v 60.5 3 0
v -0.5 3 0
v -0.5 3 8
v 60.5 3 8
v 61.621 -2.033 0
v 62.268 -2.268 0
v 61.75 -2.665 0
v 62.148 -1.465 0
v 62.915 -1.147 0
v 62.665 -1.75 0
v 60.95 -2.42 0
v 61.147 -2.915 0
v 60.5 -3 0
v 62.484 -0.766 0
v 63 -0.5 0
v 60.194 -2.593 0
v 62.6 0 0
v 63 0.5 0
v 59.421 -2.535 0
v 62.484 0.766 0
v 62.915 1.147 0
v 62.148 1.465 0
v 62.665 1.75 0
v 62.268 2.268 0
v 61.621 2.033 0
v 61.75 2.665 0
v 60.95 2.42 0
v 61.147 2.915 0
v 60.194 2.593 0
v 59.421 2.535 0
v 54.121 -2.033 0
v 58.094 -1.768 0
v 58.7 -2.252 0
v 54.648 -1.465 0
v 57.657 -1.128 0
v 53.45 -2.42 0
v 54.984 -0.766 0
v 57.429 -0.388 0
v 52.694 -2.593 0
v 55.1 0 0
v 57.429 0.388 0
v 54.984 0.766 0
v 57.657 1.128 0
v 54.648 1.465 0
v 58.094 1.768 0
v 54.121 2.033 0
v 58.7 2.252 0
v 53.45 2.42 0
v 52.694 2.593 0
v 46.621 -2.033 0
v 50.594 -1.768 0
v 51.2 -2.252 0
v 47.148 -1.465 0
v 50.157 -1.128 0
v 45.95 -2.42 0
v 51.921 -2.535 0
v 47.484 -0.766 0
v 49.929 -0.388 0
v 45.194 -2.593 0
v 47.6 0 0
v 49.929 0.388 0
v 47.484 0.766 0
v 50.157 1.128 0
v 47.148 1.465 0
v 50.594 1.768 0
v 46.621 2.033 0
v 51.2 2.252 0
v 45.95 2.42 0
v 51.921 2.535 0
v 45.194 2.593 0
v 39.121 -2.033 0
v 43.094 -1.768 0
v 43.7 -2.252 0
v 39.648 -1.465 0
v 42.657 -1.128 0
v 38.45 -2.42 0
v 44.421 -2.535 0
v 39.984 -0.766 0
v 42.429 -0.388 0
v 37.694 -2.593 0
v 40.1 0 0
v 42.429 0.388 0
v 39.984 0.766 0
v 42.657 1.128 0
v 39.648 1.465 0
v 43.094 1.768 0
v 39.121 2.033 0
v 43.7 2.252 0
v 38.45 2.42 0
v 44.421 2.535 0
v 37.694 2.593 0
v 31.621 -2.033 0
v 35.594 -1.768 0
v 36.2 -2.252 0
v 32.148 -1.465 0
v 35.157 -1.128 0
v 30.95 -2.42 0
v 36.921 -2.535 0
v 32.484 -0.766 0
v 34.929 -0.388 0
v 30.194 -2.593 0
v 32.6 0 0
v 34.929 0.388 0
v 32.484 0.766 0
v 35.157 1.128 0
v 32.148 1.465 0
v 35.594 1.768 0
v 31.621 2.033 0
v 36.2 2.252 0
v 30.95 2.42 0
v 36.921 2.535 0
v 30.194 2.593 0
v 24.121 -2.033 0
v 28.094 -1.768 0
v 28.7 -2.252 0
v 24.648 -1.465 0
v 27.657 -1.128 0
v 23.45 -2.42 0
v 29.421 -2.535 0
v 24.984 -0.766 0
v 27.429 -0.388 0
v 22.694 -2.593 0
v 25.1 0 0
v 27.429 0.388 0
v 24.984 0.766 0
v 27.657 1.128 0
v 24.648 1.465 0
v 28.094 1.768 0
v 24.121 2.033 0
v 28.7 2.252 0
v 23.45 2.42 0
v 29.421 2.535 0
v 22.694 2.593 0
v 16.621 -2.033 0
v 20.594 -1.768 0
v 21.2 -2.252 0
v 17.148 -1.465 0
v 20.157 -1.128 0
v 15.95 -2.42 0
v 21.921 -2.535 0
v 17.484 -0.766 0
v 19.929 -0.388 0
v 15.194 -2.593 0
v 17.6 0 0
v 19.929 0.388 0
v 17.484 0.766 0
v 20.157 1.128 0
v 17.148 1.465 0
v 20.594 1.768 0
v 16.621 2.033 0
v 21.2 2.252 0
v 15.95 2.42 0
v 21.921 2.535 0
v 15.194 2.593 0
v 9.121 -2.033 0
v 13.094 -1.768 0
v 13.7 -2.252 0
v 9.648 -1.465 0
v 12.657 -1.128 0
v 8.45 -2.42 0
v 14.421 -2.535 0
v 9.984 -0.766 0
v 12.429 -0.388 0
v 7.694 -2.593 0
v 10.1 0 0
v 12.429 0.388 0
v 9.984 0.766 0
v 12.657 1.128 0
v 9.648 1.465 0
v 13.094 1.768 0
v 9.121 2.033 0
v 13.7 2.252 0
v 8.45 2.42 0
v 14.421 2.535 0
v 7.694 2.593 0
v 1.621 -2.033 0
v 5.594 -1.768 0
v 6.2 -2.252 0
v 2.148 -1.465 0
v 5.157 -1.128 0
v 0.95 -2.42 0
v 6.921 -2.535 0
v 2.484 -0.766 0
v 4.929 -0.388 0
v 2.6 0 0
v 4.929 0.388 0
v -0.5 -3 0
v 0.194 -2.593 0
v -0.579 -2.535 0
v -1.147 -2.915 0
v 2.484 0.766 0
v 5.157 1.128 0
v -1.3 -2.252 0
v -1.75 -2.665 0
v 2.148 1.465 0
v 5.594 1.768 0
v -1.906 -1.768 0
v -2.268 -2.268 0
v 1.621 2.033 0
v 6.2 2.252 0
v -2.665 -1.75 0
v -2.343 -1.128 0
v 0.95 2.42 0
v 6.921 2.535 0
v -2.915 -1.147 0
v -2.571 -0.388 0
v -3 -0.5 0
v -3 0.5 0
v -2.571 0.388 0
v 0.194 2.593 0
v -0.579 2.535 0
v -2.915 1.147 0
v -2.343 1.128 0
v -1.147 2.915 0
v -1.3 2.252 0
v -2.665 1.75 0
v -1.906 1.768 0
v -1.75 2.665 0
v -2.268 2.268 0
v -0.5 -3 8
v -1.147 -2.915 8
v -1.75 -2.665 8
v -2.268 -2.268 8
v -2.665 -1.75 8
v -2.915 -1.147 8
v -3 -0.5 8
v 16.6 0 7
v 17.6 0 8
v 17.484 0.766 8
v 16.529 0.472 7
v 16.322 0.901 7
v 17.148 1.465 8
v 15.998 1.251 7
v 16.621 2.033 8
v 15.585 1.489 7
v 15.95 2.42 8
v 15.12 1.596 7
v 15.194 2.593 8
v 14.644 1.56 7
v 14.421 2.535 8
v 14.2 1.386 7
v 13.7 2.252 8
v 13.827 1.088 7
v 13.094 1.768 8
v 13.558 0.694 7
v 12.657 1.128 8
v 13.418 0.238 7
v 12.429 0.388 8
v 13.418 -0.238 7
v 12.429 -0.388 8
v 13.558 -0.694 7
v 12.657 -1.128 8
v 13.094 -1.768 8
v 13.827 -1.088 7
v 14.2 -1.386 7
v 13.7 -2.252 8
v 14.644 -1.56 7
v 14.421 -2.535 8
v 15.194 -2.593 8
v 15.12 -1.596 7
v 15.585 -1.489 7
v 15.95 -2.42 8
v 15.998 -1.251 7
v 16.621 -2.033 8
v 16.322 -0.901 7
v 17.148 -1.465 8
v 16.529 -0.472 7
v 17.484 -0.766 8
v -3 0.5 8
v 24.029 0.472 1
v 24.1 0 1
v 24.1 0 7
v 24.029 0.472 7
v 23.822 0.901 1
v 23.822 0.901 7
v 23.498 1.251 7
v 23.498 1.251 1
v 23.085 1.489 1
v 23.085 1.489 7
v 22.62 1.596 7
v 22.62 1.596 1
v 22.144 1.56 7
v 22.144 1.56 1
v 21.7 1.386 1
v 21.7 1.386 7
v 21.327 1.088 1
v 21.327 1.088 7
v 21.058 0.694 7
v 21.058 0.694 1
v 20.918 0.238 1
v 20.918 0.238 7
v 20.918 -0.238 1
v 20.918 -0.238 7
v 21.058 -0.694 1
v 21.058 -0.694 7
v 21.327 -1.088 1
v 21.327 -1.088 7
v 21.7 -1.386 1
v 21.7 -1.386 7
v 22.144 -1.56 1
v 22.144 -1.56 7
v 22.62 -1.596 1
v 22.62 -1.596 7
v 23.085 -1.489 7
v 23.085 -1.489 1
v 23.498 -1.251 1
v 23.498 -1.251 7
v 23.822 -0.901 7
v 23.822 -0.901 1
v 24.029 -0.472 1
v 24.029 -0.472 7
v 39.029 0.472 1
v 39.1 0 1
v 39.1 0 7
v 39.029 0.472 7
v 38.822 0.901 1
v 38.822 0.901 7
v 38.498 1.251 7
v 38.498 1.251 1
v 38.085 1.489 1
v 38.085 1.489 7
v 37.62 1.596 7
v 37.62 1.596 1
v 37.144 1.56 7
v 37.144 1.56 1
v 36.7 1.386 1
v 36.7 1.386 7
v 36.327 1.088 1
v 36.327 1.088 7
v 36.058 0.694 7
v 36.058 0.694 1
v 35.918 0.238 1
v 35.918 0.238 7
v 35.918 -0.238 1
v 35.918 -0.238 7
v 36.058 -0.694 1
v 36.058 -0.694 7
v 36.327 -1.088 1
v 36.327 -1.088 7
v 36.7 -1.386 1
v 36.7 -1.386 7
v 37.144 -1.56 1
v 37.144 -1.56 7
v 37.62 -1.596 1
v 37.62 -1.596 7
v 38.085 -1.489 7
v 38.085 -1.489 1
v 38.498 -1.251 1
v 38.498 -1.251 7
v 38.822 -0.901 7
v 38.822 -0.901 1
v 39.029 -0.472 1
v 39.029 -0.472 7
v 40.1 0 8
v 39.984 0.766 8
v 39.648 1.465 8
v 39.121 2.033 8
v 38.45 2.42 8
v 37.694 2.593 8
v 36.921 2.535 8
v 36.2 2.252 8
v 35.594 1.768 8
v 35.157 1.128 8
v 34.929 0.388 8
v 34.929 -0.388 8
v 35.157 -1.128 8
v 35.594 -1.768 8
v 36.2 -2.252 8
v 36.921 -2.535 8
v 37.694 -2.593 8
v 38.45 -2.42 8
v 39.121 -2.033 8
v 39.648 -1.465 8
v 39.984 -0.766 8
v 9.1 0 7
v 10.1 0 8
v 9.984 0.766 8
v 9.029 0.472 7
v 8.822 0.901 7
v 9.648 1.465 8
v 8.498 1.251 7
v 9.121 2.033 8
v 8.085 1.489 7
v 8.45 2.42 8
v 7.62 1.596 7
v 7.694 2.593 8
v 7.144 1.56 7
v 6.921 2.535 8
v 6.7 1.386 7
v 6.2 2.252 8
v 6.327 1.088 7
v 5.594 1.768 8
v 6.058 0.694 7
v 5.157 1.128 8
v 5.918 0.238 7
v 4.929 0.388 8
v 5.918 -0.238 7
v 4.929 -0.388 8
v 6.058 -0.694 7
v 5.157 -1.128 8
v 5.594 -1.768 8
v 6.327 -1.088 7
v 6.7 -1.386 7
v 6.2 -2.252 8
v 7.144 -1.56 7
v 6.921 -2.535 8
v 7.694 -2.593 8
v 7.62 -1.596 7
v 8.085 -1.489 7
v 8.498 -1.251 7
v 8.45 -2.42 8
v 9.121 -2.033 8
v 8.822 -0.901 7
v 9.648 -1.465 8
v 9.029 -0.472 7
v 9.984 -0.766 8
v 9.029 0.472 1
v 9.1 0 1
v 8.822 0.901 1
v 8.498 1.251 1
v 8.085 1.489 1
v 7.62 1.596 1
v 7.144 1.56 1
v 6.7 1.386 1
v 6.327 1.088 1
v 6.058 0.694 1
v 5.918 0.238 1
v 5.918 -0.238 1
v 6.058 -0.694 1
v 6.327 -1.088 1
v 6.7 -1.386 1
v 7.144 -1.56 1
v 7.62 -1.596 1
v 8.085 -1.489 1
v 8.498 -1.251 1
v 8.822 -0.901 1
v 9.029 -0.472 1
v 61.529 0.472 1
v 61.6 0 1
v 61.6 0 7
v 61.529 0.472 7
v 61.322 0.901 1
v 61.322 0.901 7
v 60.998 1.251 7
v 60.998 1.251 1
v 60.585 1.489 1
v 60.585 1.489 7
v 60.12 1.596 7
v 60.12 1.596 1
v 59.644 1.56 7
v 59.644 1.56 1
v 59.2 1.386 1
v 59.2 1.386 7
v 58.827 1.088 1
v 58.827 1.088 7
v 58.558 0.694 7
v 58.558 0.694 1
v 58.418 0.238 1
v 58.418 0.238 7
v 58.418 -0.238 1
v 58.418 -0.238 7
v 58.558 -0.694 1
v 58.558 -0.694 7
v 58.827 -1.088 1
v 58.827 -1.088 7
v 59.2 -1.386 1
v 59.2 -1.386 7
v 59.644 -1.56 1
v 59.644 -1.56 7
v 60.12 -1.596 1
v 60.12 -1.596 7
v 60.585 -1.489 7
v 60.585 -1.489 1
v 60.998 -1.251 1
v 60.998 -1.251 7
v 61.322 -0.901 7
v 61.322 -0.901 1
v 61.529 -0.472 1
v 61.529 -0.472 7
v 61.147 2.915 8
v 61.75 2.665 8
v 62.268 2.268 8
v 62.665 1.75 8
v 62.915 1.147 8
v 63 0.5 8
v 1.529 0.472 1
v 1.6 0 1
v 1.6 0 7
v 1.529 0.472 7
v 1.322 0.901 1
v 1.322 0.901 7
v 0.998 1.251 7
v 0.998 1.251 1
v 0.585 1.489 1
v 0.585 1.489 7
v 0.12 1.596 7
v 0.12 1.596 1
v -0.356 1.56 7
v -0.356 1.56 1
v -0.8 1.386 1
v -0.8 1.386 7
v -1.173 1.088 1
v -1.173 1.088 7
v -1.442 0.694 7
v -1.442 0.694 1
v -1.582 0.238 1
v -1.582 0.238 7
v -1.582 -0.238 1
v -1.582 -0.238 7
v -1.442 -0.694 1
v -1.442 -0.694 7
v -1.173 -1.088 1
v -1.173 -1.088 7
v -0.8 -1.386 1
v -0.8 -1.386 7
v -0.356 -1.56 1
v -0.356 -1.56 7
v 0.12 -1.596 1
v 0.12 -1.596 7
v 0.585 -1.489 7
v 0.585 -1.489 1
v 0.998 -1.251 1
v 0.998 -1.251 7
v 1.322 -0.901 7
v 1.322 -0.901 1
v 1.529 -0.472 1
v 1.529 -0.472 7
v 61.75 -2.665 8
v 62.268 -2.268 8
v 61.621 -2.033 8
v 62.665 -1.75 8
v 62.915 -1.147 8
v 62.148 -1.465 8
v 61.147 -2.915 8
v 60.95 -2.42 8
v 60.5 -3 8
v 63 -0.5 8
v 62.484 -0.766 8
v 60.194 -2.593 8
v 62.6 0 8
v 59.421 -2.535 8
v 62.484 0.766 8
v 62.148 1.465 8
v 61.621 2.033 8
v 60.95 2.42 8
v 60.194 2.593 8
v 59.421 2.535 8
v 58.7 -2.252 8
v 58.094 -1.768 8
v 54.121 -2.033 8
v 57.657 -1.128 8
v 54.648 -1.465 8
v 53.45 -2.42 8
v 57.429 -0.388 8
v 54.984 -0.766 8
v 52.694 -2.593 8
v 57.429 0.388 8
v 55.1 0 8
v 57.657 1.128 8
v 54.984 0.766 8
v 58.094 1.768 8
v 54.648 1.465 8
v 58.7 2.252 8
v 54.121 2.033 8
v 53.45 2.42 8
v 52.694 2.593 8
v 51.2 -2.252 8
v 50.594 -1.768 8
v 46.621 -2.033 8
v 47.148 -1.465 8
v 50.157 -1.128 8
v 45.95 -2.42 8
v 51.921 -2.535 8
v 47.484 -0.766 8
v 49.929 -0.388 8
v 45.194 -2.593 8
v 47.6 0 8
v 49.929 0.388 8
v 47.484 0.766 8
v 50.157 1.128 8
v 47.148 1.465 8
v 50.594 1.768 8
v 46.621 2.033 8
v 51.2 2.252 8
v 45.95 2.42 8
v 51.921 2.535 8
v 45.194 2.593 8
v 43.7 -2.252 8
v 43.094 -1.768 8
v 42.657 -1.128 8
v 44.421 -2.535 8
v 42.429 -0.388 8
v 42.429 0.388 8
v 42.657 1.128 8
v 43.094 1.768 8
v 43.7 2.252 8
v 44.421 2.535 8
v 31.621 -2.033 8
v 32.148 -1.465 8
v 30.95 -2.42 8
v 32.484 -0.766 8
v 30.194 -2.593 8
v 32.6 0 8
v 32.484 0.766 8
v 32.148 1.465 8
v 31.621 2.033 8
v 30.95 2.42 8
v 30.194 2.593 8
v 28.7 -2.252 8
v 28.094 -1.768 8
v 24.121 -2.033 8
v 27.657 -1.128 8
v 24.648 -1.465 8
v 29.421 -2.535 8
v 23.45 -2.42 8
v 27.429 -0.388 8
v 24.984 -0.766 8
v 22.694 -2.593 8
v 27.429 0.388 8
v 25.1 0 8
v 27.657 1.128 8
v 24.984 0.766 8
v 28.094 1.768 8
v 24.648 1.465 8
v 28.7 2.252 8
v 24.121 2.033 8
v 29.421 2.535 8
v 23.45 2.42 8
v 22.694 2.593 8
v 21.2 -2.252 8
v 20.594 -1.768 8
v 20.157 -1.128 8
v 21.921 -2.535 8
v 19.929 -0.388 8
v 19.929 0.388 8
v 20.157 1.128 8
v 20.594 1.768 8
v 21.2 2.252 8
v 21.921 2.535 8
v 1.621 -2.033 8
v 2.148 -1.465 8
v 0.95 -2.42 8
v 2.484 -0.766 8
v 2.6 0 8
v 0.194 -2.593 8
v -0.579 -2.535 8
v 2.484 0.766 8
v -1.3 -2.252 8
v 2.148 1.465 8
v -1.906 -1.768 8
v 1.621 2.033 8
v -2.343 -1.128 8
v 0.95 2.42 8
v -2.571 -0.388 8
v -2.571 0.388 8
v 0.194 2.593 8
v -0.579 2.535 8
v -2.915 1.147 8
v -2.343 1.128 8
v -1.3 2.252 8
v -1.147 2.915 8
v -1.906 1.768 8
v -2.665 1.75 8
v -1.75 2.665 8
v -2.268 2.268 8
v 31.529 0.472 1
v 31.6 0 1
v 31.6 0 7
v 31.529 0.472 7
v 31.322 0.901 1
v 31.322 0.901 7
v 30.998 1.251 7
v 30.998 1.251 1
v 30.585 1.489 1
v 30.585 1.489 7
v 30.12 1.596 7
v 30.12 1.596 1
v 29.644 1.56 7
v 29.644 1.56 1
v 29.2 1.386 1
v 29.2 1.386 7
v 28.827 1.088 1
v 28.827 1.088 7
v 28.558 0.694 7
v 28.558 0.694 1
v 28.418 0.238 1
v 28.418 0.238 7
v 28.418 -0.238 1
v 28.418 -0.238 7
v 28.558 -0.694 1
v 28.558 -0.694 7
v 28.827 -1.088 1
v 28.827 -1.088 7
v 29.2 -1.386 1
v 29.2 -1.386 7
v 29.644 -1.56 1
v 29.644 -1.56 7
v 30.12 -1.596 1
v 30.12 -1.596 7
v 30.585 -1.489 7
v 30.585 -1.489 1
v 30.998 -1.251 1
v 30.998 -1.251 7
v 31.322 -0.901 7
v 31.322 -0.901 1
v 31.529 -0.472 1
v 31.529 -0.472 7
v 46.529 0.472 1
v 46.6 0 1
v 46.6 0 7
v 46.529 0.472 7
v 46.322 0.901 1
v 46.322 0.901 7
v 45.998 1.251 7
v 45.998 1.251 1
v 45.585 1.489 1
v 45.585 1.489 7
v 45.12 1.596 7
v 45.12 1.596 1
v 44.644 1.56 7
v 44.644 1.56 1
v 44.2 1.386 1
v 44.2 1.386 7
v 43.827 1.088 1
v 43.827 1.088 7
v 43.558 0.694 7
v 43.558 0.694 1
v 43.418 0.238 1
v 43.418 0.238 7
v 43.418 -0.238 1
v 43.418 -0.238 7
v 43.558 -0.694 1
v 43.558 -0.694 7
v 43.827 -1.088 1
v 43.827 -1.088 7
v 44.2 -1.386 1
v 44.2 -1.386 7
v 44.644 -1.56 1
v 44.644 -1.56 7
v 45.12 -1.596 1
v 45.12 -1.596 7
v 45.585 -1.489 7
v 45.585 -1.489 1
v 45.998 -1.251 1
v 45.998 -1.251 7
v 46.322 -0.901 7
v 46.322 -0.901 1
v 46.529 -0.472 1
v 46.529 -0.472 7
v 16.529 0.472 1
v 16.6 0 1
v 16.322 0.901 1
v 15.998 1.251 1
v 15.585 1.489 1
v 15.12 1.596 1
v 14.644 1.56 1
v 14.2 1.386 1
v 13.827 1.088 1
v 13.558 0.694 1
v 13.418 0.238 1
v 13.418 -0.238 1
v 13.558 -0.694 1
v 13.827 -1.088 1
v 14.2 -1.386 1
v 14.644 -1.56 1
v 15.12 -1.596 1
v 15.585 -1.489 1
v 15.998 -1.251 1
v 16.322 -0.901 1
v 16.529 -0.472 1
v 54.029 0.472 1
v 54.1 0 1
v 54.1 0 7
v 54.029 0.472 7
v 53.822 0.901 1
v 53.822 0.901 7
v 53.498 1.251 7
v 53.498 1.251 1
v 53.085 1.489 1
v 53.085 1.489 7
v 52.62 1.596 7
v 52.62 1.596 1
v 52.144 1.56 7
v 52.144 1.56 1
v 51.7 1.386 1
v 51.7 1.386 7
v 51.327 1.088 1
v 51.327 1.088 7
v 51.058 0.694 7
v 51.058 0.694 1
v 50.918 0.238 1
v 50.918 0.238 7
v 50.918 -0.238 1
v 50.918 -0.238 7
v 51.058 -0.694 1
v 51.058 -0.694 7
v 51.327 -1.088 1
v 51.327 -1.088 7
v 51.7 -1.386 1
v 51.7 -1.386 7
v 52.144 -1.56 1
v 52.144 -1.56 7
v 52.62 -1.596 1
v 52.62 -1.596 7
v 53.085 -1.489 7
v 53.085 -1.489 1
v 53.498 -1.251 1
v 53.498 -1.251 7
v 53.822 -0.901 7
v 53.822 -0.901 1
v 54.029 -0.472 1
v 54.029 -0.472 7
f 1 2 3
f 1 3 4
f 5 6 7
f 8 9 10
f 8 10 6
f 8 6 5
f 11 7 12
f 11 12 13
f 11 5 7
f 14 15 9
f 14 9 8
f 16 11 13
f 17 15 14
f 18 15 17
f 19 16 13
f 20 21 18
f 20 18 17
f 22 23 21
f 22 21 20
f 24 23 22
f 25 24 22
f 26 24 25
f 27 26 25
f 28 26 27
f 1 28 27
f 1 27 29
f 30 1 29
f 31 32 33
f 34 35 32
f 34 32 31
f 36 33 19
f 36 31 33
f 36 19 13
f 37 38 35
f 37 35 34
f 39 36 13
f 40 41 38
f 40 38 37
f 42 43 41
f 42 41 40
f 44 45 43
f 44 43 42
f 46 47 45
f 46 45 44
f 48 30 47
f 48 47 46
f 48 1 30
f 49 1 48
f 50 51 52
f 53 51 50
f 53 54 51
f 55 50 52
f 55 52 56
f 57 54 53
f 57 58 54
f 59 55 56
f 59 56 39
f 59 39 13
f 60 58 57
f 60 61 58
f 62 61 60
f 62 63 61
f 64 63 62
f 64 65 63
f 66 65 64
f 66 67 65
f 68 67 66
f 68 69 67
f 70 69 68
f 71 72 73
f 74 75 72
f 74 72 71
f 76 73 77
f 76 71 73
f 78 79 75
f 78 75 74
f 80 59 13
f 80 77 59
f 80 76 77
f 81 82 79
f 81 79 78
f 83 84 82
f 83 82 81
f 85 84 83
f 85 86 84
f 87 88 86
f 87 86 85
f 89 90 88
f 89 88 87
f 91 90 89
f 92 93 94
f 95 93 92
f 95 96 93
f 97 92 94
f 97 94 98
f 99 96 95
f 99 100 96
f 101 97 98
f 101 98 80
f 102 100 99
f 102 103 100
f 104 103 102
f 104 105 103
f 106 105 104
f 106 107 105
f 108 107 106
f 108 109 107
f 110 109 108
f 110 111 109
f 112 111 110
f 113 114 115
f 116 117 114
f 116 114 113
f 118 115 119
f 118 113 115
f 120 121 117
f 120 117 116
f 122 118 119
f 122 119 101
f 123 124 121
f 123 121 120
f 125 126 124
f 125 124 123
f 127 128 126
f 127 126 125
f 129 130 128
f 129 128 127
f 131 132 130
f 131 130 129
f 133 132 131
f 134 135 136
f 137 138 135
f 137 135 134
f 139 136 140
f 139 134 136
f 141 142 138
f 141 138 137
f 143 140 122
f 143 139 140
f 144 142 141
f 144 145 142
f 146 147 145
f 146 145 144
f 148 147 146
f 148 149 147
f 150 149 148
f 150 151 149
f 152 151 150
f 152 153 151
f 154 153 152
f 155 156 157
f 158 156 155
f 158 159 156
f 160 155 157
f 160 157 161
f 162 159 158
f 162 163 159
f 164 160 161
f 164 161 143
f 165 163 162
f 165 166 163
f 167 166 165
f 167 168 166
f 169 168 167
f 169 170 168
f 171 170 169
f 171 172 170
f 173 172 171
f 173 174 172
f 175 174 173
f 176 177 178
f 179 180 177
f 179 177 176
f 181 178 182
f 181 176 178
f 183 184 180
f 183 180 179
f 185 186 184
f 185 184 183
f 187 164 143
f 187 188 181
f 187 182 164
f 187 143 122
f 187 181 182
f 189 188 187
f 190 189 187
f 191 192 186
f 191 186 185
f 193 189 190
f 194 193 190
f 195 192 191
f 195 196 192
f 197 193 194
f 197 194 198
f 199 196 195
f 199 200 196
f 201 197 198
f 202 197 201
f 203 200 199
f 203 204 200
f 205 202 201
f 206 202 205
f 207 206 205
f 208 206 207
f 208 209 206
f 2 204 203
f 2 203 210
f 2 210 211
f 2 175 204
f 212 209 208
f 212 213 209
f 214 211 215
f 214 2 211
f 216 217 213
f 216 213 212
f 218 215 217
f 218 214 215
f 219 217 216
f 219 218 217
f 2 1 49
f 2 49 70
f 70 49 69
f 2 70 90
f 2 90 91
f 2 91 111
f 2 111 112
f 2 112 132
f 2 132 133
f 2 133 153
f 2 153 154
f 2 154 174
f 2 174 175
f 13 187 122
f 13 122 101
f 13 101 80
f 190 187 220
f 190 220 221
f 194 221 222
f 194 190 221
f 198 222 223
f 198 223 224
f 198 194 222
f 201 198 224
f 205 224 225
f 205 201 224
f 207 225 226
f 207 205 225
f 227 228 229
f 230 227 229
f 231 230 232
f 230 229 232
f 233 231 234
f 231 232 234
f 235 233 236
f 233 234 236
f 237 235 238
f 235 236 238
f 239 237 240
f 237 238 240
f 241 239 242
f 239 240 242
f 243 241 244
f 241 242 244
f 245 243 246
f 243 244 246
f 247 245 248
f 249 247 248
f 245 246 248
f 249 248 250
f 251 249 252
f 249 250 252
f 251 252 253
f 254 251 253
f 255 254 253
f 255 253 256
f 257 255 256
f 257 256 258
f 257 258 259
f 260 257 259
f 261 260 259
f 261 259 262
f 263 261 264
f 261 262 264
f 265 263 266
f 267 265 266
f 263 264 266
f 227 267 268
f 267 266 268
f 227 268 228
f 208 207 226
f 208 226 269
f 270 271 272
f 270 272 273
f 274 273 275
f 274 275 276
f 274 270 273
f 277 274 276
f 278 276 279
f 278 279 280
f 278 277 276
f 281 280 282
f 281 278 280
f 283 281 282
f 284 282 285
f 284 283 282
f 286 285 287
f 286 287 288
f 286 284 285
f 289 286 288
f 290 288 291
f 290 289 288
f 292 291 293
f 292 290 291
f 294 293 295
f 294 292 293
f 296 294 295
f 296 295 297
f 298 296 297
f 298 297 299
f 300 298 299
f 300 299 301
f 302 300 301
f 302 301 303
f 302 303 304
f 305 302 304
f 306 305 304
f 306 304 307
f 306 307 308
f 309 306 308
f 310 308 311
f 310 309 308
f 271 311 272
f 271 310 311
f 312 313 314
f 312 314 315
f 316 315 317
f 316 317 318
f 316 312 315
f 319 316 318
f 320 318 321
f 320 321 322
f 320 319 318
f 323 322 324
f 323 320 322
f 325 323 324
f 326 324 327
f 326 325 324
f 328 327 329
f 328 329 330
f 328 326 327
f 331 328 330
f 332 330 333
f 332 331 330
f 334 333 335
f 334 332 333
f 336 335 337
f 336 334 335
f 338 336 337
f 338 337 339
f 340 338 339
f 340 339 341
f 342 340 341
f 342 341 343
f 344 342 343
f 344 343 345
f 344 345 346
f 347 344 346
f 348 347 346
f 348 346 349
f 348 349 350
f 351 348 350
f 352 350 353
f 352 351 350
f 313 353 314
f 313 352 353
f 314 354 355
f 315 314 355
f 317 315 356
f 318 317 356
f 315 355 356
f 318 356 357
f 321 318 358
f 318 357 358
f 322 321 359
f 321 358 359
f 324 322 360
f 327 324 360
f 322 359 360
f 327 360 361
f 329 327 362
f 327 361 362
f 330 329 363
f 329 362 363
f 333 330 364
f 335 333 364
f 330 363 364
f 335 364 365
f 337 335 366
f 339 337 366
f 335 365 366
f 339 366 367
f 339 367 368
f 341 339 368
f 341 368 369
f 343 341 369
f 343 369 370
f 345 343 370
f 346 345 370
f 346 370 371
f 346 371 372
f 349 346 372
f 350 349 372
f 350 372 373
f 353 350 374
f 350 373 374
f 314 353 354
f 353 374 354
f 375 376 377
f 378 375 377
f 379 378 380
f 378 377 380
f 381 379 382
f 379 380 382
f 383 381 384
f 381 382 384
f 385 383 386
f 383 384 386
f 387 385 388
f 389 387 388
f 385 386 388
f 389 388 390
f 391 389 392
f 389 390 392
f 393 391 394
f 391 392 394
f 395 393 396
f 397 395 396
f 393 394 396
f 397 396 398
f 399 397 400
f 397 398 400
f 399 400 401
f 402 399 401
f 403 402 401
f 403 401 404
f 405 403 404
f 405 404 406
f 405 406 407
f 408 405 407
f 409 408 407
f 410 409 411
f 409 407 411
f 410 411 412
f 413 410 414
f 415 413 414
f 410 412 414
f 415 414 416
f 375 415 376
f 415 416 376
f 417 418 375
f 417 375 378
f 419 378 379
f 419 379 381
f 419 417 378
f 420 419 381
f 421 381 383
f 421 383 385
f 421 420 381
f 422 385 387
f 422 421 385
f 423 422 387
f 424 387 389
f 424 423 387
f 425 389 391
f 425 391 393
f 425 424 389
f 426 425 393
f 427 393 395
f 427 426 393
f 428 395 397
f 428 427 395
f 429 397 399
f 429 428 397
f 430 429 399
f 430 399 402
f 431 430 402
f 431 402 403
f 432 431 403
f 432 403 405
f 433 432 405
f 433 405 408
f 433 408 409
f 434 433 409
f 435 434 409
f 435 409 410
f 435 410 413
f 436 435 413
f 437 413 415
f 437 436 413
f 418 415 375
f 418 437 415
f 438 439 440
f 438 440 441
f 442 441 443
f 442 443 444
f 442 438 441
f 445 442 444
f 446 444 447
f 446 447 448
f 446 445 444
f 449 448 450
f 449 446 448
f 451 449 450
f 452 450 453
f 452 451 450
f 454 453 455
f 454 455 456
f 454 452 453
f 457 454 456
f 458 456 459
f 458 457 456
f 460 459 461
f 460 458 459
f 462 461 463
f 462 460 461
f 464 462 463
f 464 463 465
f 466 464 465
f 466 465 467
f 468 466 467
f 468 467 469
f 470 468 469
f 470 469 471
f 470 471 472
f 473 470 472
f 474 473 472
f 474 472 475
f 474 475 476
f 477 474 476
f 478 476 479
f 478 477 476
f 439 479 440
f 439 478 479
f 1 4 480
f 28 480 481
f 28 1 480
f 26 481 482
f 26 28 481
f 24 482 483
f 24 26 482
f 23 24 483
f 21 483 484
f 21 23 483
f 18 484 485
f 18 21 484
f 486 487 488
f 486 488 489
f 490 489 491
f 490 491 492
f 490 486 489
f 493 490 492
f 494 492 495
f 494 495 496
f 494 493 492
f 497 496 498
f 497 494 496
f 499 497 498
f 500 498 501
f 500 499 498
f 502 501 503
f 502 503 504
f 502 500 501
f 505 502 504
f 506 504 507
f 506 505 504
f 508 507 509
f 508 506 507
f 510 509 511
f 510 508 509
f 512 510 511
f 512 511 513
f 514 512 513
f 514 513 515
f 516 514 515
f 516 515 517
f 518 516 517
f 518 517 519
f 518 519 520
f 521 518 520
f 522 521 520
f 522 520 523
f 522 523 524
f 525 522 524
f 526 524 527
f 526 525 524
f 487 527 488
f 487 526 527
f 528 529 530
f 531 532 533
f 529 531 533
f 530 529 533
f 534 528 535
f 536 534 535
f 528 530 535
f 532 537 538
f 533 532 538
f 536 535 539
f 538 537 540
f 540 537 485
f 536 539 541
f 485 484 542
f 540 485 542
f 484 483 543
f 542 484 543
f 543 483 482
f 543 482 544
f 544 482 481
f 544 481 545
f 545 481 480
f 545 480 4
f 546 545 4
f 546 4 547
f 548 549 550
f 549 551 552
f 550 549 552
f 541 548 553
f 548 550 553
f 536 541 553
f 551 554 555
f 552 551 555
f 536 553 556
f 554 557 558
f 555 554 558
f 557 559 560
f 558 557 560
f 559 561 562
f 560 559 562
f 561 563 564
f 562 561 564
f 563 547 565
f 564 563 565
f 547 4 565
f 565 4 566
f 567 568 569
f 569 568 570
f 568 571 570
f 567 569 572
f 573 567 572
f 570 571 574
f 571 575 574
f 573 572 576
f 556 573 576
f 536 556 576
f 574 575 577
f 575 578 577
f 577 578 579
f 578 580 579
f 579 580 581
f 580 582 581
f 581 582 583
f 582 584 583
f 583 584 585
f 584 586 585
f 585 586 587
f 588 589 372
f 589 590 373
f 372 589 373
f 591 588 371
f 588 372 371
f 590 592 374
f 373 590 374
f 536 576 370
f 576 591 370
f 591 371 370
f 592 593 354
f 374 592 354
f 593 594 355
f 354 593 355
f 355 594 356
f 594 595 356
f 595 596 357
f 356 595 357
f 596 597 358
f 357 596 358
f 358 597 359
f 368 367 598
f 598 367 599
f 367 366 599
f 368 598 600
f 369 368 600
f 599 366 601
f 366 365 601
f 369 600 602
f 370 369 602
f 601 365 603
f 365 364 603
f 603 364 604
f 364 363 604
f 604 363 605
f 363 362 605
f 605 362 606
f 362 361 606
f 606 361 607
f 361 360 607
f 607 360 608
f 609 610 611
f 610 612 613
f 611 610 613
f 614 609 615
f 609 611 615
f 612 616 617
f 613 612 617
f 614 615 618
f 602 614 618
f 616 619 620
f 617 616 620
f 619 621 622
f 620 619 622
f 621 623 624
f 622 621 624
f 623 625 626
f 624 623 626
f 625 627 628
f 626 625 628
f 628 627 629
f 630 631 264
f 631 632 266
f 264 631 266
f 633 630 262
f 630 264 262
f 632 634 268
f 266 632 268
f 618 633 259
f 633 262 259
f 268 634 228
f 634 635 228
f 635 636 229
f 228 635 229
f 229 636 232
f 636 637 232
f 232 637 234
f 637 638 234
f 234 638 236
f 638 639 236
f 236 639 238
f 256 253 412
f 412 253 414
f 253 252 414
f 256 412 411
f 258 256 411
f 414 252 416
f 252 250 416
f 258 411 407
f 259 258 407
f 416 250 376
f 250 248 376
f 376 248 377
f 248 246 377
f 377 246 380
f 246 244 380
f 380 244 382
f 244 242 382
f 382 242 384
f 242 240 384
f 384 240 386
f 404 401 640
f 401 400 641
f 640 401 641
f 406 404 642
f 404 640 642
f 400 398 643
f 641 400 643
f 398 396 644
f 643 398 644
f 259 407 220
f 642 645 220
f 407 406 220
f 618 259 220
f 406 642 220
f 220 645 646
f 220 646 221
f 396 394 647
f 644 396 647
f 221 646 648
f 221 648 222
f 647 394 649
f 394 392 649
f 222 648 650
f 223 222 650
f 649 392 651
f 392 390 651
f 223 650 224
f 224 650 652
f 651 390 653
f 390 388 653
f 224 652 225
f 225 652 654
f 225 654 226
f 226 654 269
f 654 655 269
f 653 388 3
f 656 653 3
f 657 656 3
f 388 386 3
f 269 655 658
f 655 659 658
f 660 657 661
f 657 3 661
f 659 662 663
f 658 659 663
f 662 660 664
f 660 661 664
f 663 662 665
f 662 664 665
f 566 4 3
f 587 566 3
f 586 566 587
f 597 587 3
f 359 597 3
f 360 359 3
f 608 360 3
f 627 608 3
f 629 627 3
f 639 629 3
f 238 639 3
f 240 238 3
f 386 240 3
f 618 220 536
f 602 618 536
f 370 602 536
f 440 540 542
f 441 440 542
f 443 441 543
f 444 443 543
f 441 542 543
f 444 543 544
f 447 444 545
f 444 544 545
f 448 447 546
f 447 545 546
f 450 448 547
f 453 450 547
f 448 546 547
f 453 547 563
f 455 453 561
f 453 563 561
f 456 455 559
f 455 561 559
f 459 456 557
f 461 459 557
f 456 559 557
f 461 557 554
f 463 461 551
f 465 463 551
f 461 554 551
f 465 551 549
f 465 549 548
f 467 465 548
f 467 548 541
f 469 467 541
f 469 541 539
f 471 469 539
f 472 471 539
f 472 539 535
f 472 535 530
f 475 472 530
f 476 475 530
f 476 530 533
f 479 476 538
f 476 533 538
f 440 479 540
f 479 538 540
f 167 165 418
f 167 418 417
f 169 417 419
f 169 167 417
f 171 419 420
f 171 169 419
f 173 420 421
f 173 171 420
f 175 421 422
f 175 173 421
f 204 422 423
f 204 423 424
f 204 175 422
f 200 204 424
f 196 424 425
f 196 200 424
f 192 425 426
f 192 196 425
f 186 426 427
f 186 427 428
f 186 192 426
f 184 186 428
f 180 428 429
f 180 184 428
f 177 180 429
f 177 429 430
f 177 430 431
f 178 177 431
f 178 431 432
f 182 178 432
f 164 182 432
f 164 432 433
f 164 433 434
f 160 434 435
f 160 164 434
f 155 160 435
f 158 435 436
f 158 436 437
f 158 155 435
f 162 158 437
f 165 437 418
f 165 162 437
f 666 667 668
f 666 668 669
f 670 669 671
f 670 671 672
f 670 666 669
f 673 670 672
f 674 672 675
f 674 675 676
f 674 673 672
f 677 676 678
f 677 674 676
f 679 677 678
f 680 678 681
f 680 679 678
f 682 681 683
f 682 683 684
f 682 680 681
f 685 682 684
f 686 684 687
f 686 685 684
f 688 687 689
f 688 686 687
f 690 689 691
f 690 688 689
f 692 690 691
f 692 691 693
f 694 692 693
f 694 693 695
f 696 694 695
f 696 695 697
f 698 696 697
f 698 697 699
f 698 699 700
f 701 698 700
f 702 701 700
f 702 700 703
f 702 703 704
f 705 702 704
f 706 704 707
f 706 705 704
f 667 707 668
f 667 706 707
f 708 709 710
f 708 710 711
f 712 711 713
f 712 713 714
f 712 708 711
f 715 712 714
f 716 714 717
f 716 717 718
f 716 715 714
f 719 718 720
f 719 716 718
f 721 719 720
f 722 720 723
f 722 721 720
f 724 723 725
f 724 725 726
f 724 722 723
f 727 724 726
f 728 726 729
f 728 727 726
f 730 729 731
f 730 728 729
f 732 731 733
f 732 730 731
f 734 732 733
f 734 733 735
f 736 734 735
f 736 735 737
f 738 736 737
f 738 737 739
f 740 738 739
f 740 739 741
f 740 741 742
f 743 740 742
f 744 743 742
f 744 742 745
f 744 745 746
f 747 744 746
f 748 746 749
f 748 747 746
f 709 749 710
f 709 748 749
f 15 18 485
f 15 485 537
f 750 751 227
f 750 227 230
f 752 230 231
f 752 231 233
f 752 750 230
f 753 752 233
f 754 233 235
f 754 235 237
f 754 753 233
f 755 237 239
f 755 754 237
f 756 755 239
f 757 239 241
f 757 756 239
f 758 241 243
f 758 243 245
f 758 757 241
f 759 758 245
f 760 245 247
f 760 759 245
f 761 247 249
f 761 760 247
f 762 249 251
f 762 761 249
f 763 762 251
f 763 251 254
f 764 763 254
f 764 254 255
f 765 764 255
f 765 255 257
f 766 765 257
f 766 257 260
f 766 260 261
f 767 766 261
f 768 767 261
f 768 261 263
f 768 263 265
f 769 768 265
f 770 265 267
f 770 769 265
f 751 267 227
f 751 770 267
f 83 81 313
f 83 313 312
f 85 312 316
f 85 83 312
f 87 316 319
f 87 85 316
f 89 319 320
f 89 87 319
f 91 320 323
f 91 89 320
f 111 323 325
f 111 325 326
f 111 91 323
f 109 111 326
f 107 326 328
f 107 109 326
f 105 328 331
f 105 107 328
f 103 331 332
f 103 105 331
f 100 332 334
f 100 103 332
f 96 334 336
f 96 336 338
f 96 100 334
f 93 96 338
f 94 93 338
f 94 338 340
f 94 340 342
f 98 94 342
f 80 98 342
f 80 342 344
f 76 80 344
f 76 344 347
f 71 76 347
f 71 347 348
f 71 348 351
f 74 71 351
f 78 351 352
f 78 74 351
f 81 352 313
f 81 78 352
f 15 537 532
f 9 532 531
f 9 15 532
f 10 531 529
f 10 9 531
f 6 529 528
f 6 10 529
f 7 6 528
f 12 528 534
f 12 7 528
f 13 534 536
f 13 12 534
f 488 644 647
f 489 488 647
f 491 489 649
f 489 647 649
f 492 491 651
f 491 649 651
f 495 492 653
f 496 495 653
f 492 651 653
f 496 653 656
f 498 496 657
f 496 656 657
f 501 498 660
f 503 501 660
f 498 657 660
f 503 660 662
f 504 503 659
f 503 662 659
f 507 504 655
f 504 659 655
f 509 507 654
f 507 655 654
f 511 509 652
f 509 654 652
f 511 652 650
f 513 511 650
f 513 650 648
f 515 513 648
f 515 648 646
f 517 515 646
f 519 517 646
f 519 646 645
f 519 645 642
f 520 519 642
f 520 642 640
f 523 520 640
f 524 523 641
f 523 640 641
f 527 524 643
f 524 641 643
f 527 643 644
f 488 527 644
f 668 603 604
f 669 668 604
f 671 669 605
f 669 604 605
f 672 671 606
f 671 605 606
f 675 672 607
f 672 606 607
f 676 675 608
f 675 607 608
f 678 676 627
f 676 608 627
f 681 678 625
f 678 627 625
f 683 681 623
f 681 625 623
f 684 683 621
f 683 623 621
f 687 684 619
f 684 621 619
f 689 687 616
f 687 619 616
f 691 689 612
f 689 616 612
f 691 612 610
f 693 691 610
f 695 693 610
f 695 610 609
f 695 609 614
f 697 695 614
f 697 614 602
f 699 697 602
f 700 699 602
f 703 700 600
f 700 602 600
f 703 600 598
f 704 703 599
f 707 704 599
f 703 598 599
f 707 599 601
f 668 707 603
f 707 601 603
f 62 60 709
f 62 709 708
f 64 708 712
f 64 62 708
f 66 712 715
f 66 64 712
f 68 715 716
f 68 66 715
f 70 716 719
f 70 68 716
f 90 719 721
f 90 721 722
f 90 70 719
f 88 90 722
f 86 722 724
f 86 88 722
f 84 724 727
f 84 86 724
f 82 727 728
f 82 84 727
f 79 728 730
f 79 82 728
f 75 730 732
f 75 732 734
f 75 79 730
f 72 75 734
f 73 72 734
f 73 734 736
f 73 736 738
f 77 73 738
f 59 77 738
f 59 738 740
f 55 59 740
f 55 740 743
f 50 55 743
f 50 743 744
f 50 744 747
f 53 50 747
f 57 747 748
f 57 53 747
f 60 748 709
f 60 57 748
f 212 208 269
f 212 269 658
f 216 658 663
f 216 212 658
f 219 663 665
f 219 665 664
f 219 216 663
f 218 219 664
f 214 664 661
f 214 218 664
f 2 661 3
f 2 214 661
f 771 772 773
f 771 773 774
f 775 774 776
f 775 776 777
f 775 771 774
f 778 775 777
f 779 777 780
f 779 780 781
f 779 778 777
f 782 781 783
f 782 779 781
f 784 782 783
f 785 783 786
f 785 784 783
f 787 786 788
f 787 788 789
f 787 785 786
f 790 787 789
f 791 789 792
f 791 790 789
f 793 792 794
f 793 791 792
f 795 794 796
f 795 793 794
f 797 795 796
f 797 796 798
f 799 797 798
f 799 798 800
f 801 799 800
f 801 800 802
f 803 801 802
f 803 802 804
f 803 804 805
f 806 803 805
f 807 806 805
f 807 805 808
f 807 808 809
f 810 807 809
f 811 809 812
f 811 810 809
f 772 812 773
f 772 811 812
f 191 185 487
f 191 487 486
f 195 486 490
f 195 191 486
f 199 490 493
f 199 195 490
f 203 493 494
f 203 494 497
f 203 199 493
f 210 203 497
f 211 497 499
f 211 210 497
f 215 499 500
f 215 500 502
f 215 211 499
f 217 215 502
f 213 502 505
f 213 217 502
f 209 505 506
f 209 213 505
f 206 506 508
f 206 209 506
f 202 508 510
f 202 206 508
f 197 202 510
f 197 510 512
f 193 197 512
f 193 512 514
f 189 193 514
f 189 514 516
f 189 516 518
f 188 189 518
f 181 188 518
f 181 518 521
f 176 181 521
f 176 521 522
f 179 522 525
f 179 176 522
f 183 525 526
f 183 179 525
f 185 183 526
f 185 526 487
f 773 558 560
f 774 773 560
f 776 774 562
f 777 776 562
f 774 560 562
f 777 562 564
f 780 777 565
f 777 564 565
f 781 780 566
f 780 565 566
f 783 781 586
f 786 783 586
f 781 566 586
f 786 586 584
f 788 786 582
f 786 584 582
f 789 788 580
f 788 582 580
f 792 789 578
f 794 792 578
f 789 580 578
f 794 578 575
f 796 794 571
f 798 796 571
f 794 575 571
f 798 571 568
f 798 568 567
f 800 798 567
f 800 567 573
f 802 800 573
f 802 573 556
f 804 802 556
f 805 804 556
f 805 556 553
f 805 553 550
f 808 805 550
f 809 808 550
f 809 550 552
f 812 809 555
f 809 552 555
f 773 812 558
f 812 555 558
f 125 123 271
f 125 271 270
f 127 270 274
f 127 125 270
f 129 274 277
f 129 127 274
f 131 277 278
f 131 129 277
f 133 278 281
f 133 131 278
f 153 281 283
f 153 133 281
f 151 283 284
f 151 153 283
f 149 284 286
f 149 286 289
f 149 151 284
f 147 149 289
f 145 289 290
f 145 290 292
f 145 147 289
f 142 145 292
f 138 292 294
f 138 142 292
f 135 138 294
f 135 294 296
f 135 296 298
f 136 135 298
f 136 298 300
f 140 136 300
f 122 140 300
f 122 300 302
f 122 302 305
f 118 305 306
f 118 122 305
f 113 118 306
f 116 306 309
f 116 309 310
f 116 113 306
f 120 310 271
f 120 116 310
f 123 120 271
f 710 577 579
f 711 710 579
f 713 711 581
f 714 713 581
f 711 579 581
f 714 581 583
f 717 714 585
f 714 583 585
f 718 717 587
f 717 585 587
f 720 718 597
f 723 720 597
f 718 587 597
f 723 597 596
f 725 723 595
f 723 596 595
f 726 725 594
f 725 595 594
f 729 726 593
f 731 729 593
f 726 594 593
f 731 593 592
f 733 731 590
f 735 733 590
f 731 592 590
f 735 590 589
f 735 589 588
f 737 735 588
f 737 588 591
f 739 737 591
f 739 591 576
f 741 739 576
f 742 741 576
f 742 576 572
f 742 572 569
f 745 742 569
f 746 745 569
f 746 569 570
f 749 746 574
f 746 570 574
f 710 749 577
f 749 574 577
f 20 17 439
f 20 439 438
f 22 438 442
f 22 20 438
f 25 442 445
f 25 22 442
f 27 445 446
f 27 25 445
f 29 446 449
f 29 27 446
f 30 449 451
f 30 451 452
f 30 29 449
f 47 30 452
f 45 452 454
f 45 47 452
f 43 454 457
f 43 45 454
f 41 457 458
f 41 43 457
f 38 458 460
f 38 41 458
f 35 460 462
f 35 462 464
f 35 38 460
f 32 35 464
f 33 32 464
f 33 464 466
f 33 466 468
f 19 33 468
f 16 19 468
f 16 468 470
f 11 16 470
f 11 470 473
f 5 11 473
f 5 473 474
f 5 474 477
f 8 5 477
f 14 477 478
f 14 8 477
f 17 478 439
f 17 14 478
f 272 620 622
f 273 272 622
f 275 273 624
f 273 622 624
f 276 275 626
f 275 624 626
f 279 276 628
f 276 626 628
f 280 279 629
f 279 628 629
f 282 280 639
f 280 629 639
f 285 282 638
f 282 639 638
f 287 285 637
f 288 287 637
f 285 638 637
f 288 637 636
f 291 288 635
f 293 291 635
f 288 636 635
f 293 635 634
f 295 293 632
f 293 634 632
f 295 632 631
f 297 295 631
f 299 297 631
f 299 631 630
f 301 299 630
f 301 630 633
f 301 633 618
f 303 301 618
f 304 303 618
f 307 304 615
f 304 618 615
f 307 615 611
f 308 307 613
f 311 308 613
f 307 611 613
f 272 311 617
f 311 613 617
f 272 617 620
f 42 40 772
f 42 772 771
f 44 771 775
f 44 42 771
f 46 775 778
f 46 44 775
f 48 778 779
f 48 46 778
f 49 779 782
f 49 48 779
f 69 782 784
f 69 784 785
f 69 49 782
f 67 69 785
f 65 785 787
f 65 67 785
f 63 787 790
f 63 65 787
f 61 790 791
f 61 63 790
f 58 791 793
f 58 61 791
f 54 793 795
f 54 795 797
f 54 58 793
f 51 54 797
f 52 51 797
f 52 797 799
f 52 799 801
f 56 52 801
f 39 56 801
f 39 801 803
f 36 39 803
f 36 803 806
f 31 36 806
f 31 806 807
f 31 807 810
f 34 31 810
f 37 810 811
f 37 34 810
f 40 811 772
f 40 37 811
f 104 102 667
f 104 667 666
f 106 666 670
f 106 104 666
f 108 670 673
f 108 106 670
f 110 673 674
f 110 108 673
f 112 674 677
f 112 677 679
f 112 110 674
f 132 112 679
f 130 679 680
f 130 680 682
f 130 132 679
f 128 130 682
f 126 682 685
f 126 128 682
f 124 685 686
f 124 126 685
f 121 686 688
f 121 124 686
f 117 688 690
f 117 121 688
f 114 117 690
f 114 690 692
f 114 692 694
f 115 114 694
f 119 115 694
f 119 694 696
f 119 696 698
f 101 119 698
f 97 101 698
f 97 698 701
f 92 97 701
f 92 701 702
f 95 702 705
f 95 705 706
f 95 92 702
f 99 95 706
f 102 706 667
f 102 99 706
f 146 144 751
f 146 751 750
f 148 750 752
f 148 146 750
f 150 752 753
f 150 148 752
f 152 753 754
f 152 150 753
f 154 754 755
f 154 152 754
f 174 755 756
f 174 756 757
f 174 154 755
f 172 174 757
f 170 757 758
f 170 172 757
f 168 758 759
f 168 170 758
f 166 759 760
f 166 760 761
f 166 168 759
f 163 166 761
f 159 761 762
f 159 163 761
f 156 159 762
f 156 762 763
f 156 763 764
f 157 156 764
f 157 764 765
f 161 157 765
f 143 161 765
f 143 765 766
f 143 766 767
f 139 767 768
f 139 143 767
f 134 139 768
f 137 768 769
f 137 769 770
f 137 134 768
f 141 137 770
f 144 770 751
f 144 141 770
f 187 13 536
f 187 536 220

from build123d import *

# Parameters (mm, degrees)
SKETCH1_R           = 1.6
BOSS_EXTRUDE1_DEPTH = 8
CHAMFER1_SIZE       = 1


with BuildPart() as part:
    # Sketch1 → Boss-Extrude1 (new body)
    with BuildSketch(Plane.XY):
        with BuildLine():
            Line((-0.5, 3), (60.5, 3))
            ThreePointArc((60.5, 3), (62.267766953, 2.267766953), (63, 0.5))
            Line((63, 0.5), (63, -0.5))
            ThreePointArc((63, -0.5), (62.267766953, -2.267766953), (60.5, -3))
            Line((60.5, -3), (-0.5, -3))
            ThreePointArc((-0.5, -3), (-2.267766953, -2.267766953), (-3, -0.5))
            Line((-3, -0.5), (-3, 0.5))
            ThreePointArc((-3, 0.5), (-2.267766953, 2.267766953), (-0.5, 3))
        make_face()
        Circle(SKETCH1_R, mode=Mode.SUBTRACT)
        with Locations((7.5, 0)):
            Circle(SKETCH1_R, mode=Mode.SUBTRACT)
        with Locations((15, 0)):
            Circle(SKETCH1_R, mode=Mode.SUBTRACT)
        with Locations((22.5, 0)):
            Circle(SKETCH1_R, mode=Mode.SUBTRACT)
        with Locations((30, 0)):
            Circle(SKETCH1_R, mode=Mode.SUBTRACT)
        with Locations((37.5, 0)):
            Circle(SKETCH1_R, mode=Mode.SUBTRACT)
        with Locations((45, 0)):
            Circle(SKETCH1_R, mode=Mode.SUBTRACT)
        with Locations((52.5, 0)):
            Circle(SKETCH1_R, mode=Mode.SUBTRACT)
        with Locations((60, 0)):
            Circle(SKETCH1_R, mode=Mode.SUBTRACT)
    extrude(amount=BOSS_EXTRUDE1_DEPTH)

    # Chamfer1
    chamfer1_edges = [part.edges().sort_by_distance(p)[0] for p in [
        (-1.6, 0, 0),
        (-1.6, 0, 8),
        (5.9, 0, 0),
        (5.9, 0, 8),
        (13.4, 0, 0),
        (13.4, 0, 8),
        (20.9, 0, 0),
        (20.9, 0, 8),
        (28.4, 0, 0),
        (28.4, 0, 8),
        (35.9, 0, 0),
        (35.9, 0, 8),
        (43.4, 0, 0),
        (43.4, 0, 8),
        (50.9, 0, 0),
        (50.9, 0, 8),
        (58.4, 0, 0),
        (58.4, 0, 8),
    ]]
    chamfer(chamfer1_edges, length=CHAMFER1_SIZE)


solid = part.part
